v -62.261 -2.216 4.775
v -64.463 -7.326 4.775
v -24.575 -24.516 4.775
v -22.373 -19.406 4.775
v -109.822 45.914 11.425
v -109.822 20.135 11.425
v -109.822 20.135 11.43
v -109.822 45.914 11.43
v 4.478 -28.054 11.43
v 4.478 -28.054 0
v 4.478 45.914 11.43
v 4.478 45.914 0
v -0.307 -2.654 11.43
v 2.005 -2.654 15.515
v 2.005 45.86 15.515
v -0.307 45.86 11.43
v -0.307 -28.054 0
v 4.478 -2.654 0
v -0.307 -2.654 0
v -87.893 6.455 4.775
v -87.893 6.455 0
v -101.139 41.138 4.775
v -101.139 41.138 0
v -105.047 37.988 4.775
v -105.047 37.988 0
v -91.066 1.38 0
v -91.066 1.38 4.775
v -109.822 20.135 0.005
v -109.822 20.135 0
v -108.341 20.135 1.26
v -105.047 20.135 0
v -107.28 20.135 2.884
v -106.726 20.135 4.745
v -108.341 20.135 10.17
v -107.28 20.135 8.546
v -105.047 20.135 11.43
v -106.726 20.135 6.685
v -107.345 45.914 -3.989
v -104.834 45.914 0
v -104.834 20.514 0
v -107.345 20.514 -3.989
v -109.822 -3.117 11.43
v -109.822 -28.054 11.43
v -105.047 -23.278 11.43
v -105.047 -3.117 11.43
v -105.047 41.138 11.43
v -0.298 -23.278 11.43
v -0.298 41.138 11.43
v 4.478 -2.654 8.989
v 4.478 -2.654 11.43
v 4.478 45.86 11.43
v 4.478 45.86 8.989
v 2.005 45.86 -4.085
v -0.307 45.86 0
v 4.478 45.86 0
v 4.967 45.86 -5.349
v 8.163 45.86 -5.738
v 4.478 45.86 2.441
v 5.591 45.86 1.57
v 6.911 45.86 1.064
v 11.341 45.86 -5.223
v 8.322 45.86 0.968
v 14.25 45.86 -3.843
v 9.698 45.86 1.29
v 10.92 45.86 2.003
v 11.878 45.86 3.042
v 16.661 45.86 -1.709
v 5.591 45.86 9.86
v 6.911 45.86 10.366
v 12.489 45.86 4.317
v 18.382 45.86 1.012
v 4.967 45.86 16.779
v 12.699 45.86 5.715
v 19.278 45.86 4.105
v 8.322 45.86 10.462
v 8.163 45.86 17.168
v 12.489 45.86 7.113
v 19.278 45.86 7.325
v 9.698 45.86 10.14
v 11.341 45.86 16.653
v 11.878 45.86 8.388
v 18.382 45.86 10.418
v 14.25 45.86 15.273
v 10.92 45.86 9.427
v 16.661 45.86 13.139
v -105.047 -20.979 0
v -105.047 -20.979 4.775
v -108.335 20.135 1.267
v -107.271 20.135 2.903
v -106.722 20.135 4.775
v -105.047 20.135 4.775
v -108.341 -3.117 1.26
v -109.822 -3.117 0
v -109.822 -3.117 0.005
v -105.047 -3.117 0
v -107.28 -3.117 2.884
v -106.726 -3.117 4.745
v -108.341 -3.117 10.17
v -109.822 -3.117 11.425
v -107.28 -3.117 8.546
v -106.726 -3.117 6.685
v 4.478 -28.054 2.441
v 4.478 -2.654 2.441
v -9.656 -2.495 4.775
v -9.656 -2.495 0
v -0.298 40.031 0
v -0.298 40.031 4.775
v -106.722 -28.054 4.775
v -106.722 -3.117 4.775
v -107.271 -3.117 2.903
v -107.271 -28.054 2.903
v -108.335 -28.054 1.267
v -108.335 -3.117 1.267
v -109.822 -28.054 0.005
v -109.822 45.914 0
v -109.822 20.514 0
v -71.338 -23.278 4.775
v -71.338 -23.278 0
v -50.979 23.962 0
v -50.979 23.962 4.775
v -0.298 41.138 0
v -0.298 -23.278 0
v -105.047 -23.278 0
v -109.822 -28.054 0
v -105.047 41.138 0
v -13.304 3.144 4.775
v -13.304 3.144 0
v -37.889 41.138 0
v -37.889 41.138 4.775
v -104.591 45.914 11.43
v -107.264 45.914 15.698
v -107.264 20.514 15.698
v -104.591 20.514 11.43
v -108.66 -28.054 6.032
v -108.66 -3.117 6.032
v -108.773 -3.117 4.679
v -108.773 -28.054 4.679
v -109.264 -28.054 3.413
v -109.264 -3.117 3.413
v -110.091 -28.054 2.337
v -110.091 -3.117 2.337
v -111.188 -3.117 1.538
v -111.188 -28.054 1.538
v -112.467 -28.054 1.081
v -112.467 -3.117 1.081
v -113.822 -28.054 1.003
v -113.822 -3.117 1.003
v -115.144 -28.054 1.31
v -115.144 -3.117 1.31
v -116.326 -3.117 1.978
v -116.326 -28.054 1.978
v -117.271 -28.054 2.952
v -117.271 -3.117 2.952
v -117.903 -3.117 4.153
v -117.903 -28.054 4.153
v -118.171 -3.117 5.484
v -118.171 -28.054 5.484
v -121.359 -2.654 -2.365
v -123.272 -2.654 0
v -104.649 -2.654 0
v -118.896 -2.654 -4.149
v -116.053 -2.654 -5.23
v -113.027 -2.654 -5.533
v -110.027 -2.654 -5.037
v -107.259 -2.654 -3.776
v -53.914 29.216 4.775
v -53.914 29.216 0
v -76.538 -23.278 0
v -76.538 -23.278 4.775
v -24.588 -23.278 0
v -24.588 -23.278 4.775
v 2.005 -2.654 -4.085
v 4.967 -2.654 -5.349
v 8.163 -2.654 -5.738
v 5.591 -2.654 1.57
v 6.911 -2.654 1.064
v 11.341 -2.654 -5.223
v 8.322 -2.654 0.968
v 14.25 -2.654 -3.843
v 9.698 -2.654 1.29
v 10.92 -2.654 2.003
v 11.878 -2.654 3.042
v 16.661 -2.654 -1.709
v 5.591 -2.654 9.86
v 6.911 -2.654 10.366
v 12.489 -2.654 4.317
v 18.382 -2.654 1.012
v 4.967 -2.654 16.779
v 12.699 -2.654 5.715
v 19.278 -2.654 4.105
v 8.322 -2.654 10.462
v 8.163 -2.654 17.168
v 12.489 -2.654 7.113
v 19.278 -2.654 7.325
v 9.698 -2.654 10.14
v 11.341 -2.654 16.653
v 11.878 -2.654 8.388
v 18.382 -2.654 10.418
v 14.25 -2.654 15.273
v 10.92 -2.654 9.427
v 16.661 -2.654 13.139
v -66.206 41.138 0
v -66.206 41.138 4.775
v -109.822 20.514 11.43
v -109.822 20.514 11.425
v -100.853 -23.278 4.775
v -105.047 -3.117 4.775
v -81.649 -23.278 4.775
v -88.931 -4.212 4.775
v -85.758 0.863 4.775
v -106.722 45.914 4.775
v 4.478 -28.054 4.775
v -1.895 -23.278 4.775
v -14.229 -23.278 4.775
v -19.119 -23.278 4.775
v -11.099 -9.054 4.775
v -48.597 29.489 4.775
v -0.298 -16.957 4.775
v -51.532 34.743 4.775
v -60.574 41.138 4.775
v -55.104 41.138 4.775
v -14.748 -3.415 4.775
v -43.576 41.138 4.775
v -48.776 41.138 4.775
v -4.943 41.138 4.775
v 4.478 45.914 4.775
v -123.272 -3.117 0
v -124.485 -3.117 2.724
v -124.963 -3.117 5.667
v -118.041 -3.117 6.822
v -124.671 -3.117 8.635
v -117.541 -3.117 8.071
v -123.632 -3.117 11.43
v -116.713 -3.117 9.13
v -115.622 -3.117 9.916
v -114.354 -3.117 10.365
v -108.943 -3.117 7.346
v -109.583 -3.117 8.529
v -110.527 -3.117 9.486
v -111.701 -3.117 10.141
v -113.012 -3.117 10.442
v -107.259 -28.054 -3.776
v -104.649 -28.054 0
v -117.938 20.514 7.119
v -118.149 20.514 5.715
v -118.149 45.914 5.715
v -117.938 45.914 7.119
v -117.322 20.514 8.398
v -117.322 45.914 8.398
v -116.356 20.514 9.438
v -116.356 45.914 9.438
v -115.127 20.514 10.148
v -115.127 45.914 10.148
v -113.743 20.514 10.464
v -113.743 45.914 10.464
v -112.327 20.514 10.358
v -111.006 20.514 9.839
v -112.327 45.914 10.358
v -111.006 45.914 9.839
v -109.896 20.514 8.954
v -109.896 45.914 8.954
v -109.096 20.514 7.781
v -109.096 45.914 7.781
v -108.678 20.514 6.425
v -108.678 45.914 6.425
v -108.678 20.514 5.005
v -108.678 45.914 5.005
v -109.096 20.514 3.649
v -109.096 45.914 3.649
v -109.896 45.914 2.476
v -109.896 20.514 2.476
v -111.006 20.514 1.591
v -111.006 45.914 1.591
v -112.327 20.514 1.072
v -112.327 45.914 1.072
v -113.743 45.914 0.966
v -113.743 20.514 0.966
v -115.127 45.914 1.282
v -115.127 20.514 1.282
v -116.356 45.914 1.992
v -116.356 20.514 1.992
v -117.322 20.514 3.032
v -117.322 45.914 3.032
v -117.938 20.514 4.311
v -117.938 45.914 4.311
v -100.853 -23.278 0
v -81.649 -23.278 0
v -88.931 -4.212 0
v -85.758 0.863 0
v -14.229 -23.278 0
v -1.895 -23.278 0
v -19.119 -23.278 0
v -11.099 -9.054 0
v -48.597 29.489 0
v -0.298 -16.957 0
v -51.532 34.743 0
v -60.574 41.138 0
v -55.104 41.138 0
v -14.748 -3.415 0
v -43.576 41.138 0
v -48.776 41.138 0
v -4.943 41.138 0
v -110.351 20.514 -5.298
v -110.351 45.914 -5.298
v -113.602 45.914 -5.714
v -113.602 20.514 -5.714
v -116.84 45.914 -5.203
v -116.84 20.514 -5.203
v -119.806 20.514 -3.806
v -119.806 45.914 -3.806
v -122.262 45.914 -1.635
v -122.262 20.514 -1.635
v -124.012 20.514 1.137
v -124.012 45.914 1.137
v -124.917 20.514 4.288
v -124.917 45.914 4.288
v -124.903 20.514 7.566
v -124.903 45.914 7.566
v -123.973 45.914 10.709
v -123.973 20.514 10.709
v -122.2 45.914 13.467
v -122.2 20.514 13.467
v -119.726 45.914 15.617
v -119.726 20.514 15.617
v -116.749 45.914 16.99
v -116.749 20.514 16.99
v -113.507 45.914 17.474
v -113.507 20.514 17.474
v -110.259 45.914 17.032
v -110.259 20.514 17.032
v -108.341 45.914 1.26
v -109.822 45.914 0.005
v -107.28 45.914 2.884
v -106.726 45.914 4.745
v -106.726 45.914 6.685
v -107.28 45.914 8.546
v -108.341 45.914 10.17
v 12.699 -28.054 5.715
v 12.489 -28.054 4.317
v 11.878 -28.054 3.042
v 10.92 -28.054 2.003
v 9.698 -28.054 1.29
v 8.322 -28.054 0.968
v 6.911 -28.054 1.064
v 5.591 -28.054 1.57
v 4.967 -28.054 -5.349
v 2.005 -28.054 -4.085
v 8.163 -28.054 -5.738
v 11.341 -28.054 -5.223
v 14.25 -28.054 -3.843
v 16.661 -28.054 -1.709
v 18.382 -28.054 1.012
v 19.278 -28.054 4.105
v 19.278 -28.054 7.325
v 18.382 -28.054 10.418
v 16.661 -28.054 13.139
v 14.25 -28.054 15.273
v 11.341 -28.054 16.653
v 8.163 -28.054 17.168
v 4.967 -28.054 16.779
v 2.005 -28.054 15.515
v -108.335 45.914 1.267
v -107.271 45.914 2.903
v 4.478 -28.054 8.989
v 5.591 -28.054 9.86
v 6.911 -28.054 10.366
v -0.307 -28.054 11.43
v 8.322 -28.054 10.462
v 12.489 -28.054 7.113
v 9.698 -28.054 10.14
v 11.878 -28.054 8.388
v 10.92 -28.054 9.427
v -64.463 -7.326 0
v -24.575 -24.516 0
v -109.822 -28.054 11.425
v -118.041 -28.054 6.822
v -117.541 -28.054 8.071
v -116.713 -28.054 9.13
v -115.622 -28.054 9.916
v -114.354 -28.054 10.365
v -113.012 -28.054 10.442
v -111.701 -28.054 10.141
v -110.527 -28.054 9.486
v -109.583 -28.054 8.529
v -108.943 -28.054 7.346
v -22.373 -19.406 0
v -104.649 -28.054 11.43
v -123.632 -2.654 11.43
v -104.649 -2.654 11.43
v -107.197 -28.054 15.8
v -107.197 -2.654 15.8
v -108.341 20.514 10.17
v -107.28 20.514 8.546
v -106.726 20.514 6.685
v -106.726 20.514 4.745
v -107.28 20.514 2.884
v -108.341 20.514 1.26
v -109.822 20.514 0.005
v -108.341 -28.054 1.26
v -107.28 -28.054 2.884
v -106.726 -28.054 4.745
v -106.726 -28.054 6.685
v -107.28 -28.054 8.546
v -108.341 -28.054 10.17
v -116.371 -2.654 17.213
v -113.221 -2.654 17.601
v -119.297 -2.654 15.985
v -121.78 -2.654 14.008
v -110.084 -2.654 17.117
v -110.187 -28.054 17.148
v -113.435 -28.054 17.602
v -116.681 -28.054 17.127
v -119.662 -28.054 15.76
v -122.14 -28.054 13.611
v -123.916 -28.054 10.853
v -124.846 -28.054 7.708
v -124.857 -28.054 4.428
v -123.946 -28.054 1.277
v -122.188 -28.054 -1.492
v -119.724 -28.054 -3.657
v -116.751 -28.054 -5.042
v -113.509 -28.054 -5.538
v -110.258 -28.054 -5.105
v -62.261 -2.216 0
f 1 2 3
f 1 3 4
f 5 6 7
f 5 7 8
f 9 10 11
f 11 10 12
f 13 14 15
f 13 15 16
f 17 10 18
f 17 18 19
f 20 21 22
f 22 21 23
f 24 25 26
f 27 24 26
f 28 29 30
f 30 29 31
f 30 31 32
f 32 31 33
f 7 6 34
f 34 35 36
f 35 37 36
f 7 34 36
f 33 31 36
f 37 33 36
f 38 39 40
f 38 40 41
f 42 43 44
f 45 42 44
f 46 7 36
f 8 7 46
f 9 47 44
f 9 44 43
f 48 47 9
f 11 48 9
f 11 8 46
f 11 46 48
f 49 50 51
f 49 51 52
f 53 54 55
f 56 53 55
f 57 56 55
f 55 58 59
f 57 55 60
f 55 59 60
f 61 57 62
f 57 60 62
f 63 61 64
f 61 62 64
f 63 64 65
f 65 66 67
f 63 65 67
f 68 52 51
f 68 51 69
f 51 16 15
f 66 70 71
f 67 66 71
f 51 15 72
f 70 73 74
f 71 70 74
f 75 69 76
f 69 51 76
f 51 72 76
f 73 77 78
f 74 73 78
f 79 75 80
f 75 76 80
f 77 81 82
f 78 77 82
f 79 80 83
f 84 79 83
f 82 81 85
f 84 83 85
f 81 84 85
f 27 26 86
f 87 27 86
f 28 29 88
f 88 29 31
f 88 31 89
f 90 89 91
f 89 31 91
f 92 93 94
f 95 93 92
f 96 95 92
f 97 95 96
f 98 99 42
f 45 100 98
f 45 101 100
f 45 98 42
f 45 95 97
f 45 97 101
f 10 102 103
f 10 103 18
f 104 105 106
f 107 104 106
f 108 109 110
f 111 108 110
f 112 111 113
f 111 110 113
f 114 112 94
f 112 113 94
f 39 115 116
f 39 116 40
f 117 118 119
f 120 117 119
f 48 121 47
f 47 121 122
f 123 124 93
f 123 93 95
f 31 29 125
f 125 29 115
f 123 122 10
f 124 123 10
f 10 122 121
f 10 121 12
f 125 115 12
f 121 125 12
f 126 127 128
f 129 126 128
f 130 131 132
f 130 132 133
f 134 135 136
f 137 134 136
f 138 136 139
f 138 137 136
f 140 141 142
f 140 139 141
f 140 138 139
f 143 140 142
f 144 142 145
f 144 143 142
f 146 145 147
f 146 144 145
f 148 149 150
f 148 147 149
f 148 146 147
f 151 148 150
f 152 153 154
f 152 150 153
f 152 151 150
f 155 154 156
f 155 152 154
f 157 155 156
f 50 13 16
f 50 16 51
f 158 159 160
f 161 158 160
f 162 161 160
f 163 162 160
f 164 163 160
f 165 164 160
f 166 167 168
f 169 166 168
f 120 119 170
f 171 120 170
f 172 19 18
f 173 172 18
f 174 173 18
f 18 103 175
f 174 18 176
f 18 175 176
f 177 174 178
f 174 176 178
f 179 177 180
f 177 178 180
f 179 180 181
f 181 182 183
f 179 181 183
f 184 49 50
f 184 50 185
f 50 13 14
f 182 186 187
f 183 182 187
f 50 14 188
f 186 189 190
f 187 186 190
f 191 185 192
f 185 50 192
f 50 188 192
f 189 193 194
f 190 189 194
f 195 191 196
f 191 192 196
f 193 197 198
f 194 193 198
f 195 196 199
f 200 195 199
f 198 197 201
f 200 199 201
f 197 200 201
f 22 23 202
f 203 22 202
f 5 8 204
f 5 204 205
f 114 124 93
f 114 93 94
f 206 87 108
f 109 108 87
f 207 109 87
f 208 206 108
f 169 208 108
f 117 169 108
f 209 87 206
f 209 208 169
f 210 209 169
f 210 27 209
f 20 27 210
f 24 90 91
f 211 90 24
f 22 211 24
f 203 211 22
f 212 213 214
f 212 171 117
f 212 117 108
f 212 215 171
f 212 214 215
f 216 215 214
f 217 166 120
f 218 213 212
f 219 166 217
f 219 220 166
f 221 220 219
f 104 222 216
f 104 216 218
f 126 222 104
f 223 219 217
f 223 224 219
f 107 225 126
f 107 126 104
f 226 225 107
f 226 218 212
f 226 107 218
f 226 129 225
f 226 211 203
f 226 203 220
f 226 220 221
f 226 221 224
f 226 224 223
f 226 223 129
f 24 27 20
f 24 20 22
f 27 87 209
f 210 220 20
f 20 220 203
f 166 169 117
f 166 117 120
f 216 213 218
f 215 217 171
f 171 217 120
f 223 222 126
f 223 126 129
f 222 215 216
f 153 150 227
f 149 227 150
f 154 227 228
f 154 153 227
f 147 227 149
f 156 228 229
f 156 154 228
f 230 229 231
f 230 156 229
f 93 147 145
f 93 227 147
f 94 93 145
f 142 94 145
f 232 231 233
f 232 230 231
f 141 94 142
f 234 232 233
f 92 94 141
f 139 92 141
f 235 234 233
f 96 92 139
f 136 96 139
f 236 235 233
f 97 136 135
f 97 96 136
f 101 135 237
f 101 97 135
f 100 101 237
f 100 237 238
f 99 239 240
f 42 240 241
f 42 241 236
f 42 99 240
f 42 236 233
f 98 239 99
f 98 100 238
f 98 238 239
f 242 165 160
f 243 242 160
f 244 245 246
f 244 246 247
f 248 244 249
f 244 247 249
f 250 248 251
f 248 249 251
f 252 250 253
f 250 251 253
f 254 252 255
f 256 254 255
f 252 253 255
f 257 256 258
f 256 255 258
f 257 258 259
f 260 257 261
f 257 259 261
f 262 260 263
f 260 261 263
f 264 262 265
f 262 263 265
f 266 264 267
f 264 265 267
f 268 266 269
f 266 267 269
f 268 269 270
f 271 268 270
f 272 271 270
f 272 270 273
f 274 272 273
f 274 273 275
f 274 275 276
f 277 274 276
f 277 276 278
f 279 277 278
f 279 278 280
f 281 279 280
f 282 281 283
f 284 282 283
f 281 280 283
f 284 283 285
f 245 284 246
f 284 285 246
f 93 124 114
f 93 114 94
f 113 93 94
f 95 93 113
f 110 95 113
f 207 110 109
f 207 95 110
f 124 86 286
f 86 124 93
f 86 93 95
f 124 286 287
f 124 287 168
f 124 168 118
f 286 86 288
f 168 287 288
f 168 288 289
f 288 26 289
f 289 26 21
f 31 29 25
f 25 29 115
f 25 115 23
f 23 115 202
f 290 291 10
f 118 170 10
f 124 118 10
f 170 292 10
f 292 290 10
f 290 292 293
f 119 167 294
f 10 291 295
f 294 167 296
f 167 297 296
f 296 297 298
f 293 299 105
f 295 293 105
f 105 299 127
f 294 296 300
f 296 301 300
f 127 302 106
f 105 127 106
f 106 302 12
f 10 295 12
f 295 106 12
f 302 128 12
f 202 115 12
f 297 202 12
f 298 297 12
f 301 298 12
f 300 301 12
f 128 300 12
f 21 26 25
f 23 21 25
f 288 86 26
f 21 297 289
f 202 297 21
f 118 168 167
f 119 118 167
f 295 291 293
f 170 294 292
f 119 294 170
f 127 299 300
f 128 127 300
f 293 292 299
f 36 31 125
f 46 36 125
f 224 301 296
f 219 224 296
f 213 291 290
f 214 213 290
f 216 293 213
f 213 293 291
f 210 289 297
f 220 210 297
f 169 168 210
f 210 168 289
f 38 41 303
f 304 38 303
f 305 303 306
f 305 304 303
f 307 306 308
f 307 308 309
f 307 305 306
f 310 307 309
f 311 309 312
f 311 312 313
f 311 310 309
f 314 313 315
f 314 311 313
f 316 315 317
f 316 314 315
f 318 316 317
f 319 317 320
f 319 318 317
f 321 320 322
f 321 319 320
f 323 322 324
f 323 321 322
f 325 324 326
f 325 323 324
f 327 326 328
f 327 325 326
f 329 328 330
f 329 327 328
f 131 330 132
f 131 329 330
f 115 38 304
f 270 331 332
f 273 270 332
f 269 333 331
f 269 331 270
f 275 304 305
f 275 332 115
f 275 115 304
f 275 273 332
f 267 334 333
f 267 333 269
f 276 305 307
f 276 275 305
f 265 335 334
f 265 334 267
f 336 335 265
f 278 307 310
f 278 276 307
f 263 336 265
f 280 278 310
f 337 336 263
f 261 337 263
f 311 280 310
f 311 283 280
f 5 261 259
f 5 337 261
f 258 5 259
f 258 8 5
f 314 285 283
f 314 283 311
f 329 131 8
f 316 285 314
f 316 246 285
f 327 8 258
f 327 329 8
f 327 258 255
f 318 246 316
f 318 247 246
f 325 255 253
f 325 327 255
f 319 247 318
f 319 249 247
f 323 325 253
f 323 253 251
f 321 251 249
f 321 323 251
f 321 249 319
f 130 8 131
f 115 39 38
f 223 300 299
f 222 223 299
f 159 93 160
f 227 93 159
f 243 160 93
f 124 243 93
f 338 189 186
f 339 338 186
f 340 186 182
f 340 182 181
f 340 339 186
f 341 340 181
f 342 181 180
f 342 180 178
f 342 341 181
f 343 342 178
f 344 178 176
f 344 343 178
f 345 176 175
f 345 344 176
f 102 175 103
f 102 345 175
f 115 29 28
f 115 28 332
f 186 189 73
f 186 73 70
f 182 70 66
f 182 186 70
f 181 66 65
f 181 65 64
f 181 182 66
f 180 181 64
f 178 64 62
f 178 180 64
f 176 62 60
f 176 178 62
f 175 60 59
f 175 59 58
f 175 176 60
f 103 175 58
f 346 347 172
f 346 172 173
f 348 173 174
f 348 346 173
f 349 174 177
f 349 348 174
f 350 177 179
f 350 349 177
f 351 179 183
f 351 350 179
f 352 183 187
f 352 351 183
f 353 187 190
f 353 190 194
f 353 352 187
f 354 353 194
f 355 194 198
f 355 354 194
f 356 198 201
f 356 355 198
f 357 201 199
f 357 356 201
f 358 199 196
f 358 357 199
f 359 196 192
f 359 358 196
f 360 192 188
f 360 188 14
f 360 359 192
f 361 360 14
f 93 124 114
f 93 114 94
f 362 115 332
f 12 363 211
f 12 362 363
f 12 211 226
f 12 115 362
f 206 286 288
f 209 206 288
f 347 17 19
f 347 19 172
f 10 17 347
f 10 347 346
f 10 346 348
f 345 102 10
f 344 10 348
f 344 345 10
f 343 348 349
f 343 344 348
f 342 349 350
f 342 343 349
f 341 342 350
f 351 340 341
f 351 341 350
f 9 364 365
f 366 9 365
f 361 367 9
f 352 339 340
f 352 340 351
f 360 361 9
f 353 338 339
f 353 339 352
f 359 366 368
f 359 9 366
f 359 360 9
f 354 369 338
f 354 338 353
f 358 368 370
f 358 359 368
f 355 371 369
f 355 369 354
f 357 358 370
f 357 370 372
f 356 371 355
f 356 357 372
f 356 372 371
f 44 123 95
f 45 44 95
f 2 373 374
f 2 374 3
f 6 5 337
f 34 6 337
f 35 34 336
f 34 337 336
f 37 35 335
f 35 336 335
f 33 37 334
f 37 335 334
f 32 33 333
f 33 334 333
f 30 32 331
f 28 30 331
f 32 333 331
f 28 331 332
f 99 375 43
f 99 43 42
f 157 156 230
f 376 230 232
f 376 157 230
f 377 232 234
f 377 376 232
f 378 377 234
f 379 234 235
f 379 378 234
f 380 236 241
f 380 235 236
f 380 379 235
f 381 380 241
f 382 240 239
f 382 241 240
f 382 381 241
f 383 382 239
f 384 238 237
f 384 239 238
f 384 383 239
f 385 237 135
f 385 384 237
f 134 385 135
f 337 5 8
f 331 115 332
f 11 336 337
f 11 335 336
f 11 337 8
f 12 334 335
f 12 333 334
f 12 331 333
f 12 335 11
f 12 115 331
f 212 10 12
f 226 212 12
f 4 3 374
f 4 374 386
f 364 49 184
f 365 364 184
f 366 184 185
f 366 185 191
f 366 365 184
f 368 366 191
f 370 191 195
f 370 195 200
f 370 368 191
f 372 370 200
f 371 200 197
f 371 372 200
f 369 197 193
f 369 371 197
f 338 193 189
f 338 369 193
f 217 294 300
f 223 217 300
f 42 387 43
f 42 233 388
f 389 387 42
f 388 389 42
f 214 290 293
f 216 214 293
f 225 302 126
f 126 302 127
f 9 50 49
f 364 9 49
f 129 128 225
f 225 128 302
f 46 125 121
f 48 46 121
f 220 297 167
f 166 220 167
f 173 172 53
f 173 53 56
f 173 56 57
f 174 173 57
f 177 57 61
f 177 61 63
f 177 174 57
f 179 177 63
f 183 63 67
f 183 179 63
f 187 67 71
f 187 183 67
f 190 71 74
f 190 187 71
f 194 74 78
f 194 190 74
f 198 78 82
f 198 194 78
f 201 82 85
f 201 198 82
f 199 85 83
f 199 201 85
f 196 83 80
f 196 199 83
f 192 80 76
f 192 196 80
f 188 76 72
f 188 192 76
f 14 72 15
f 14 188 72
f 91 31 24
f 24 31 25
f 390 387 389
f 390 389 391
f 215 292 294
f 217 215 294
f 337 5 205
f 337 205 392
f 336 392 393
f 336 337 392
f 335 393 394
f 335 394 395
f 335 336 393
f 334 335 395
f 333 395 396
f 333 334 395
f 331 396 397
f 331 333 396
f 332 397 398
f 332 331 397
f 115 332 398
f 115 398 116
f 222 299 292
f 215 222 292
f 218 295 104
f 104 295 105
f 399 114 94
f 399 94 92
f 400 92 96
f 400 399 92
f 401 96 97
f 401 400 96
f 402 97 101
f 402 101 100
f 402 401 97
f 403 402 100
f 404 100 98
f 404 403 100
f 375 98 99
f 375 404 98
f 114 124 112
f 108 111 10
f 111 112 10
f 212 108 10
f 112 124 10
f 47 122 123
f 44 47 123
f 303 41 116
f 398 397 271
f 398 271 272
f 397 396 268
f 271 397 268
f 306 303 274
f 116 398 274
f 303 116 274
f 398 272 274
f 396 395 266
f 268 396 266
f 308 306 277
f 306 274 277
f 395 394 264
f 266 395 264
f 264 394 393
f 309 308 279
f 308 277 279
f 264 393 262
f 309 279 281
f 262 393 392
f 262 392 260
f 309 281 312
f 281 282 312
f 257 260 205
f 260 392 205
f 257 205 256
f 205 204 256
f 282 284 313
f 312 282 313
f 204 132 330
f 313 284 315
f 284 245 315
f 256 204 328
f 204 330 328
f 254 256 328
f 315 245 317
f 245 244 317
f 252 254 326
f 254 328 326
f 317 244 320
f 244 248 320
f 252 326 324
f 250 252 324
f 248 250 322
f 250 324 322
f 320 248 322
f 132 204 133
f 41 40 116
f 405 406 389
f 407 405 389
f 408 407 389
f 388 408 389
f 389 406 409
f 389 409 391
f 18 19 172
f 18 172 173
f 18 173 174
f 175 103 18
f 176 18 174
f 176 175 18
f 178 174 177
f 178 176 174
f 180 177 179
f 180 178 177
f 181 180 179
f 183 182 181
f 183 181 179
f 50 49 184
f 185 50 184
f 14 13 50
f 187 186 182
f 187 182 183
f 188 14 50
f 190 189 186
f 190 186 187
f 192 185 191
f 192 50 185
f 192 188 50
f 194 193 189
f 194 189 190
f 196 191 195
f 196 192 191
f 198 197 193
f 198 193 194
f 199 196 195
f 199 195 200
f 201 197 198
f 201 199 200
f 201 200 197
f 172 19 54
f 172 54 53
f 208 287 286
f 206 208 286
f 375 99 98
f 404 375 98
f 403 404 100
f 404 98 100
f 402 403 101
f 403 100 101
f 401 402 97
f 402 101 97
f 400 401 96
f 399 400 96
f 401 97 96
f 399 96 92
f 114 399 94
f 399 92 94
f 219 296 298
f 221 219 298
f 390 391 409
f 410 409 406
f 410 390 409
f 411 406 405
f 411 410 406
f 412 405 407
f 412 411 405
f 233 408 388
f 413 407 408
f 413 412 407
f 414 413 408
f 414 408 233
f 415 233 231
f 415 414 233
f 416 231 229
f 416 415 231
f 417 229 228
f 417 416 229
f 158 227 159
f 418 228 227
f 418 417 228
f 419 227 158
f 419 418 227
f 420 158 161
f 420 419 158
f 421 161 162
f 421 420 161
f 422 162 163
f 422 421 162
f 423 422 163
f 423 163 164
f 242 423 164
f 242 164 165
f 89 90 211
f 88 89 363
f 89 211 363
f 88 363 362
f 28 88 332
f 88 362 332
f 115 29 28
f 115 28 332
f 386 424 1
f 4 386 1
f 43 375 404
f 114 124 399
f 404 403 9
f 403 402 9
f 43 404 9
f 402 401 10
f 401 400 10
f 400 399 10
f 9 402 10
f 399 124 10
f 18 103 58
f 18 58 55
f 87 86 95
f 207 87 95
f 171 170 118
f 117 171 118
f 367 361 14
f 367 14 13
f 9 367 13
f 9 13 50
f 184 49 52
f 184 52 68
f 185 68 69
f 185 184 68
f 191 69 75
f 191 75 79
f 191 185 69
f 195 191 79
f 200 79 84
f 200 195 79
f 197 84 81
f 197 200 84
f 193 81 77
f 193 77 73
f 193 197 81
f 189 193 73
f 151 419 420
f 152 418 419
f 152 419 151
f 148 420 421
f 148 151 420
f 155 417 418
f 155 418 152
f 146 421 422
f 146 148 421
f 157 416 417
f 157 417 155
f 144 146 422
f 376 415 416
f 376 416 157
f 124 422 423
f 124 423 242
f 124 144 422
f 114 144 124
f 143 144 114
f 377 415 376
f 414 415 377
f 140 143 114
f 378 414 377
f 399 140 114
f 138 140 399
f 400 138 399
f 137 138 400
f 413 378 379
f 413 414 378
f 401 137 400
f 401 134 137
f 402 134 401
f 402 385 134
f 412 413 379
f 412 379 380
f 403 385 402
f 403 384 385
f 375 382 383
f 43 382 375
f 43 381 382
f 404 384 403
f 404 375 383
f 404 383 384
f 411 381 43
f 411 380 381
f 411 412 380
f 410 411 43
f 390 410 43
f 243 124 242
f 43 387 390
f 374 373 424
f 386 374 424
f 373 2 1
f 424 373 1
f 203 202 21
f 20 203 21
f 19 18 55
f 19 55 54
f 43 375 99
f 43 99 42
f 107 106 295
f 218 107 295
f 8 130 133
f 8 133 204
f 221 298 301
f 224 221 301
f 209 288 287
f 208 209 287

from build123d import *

# Parameters (mm, degrees)
F0_W      = 114.3
F0_H      = 73.967157311
F1_DEPTH  = 4.7752
F2_DEPTH  = 11.43
F4_D      = 13.462
F4_2_D    = 13.462
F5_R      = 4.7625
F6_DEPTH  = 25.4
F8_DEPTH  = 25.4
F9_W      = 23.2523302548
F9_H      = 11.43
F10_DEPTH = 25.4
F11_W     = 5.5641233921
F11_H     = 4.7752
F12_DEPTH = 43.434
F13_DEPTH = 48.514


# Not quite as in the source:
# - a feature names something its author has since deleted; it is built from what else it names


with BuildPart() as f1:
    # F0 (on Top) → F1 (new body)
    with BuildSketch(Plane.XY):
        with Locations((-52.6723831377, 8.9299433027)):
            Rectangle(F0_W, F0_H)
        Polygon((-105.0471831377, 37.9876717925), (-105.0471831377, 41.1383219582), (-101.1388456313, 41.1383219582), (-66.2060131753, 41.1383219582), (-60.5741511644, 41.1383219582), (-55.1043535892, 41.1383219582), (-48.7759712627, 41.1383219582), (-43.5761829824, 41.1383219582), (-37.8885207676, 41.1383219582), (-10.4127929617, 41.1383219582), (-9.5890923762, 41.1383219582), (-5.273707792, 41.1383219582), (-4.9433377569, 41.1383219582), (-0.2975831377, 41.1383219582), (-0.2975831377, 40.0308892131), (-0.2975831377, -16.9571155447), (-0.2975831377, -23.2784353529), (-1.8950043824, -23.2784353529), (-14.22920956, -23.2784353529), (-19.1186619188, -23.2784353529), (-24.5884594941, -23.2784353529), (-36.035214648, -23.2784353529), (-42.7883672511, -23.2784353529), (-71.3379746857, -23.2784353529), (-76.537762966, -23.2784353529), (-81.6493495712, -23.2784353529), (-100.8529136018, -23.2784353529), (-105.0471831377, -23.2784353529), (-105.0471831377, -20.9793318063), align=None, mode=Mode.SUBTRACT)
        Polygon((-48.5966583669, 29.4891190576), (-50.9787348492, 23.9618950121), (-24.5884594941, -23.2784353529), (-19.1186619188, -23.2784353529), align=None)
        Polygon((-50.9787348492, 23.9618950121), (-53.9140346901, 29.2162749813), (-76.537762966, -23.2784353529), (-71.3379746857, -23.2784353529), align=None)
        Polygon((-37.8885207676, 41.1383219582), (-43.5761829824, 41.1383219582), (-14.7476233332, -3.4151765974), (-13.304202216, 3.1441448502), align=None)
        Polygon((-60.5741511644, 41.1383219582), (-66.2060131753, 41.1383219582), (-87.8930449112, 6.4548268458), (-85.7575604218, 0.8631629356), align=None)
        Polygon((-4.9433377569, 41.1383219582), (-13.304202216, 3.1441448502), (-9.655600407, -2.4946375728), (-0.2975831377, 40.0308892131), (-0.2975831377, 41.1383219582), align=None)
        Polygon((-101.1388456313, 41.1383219582), (-105.0471831377, 41.1383219582), (-105.0471831377, 37.9876717925), (-91.0664245982, 1.3797248123), (-87.8930449112, 6.4548268458), align=None)
        Polygon((-91.0664245982, 1.3797248123), (-105.0471831377, -20.9793318063), (-105.0471831377, -23.2784353529), (-100.8529136018, -23.2784353529), (-88.9309401089, -4.2119390979), align=None)
        Polygon((-85.7575604218, 0.8631629356), (-88.9309401089, -4.2119390979), (-81.6493495712, -23.2784353529), (-76.537762966, -23.2784353529), align=None)
        Polygon((-9.655600407, -2.4946375728), (-11.0990215241, -9.0539590204), (-1.8950043824, -23.2784353529), (-0.2975831377, -23.2784353529), (-0.2975831377, -16.9571155447), align=None)
        Polygon((-11.0990215241, -9.0539590204), (-14.7476233332, -3.4151765974), (-19.1186619188, -23.2784353529), (-14.22920956, -23.2784353529), align=None)
        Polygon((-55.1043535892, 41.1383219582), (-60.5741511644, 41.1383219582), (-53.9140346901, 29.2162749813), (-51.5319582079, 34.7434990268), align=None)
        Polygon((-43.5761829824, 41.1383219582), (-48.7759712627, 41.1383219582), (-51.5319582079, 34.7434990268), (-48.5966583669, 29.4891190576), align=None)
        Polygon((-13.304202216, 3.1441448502), (-14.7476233332, -3.4151765974), (-11.0990215241, -9.0539590204), (-9.655600407, -2.4946375728), align=None)
        Polygon((-51.5319582079, 34.7434990268), (-53.9140346901, 29.2162749813), (-50.9787348492, 23.9618950121), (-48.5966583669, 29.4891190576), align=None)
        Polygon((-87.8930449112, 6.4548268458), (-91.0664245982, 1.3797248123), (-88.9309401089, -4.2119390979), (-85.7575604218, 0.8631629356), align=None)
    extrude(amount=F1_DEPTH)

    # F4 (through all)
    with Locations(Plane.XZ.offset(28.0536353529)):
        with Locations((-113.3868669575, 5.715)):
            Hole(F4_D / 2)


with BuildPart() as f2:
    # F0 (on Top) → F2 (new body)
    with BuildSketch(Plane.XY):
        with Locations((-52.6723831377, 8.9299433027)):
            Rectangle(F0_W, F0_H)
        Polygon((-105.0471831377, 37.9876717925), (-105.0471831377, 41.1383219582), (-101.1388456313, 41.1383219582), (-66.2060131753, 41.1383219582), (-60.5741511644, 41.1383219582), (-55.1043535892, 41.1383219582), (-48.7759712627, 41.1383219582), (-43.5761829824, 41.1383219582), (-37.8885207676, 41.1383219582), (-10.4127929617, 41.1383219582), (-9.5890923762, 41.1383219582), (-5.273707792, 41.1383219582), (-4.9433377569, 41.1383219582), (-0.2975831377, 41.1383219582), (-0.2975831377, 40.0308892131), (-0.2975831377, -16.9571155447), (-0.2975831377, -23.2784353529), (-1.8950043824, -23.2784353529), (-14.22920956, -23.2784353529), (-19.1186619188, -23.2784353529), (-24.5884594941, -23.2784353529), (-36.035214648, -23.2784353529), (-42.7883672511, -23.2784353529), (-71.3379746857, -23.2784353529), (-76.537762966, -23.2784353529), (-81.6493495712, -23.2784353529), (-100.8529136018, -23.2784353529), (-105.0471831377, -23.2784353529), (-105.0471831377, -20.9793318063), align=None, mode=Mode.SUBTRACT)
    extrude(amount=F2_DEPTH)

    # F4#2 (through all)
    with Locations(Plane.XZ.offset(28.0536353529)):
        with Locations((-113.3868669575, 5.715)):
            Hole(F4_2_D / 2)


with BuildPart() as f6:
    # F5 (on face) → F6 (new body)
    with BuildSketch(Plane(origin=(0, 45.9135219582, 0), x_dir=(-1, 0, 0), z_dir=(0, 1, 0))):
        with BuildLine():
            Line((104.8336997628, 0), (107.3452308774, -3.989065066))
            ThreePointArc((107.3452308774, -3.989065066), (125.0266367946, 5.9274575081), (107.264213264, 15.698119998))
            Line((107.264213264, 15.698119998), (104.5906469226, 11.43))
            Line((104.5906469226, 11.43), (109.8223831377, 11.43))
            Line((109.8223831377, 11.43), (109.8223831377, 11.4247124357))
            ThreePointArc((109.8223831377, 11.4247124357), (106.6558669575, 5.715), (109.8223831377, 0.0052875643))
            Line((109.8223831377, 0.0052875643), (109.8223831377, 0))
            Line((109.8223831377, 0), (104.8336997628, 0))
        make_face()
        with Locations((113.3868669575, 5.715)):
            Circle(F5_R, mode=Mode.SUBTRACT)
    extrude(amount=-F6_DEPTH)


with BuildPart() as f8:
    # F7 (on face) → F8 (new body)
    with BuildSketch(Plane.XZ.offset(28.0536353529)):
        with BuildLine():
            Line((-0.3069167142, 0), (2.00510988, -4.0852471483))
            ThreePointArc((2.00510988, -4.0852471483), (19.3918963109, 5.715), (2.00510988, 15.5152471483))
            Line((2.00510988, 15.5152471483), (-0.3069167142, 11.43))
            Line((-0.3069167142, 11.43), (4.4776168623, 11.43))
            Line((4.4776168623, 11.43), (4.4776168623, 8.9887683501))
            ThreePointArc((4.4776168623, 8.9887683501), (9.6983834917, 10.139608436), (12.6989963109, 5.715))
            ThreePointArc((12.6989963109, 5.715), (9.6983834917, 1.290391564), (4.4776168623, 2.4412316499))
            Line((4.4776168623, 2.4412316499), (4.4776168623, 0))
            Line((4.4776168623, 0), (-0.3069167142, 0))
        make_face()
    extrude(amount=-F8_DEPTH)


with BuildPart() as f8b:
    # F7 (on face) → F8, piece 2 (new body)
    with BuildSketch(Plane.XZ.offset(28.0536353529)):
        with BuildLine():
            Line((-107.2588041425, -3.7761165295), (-104.6486571431, 0))
            Line((-104.6486571431, 0), (-109.8223831377, 0))
            Line((-109.8223831377, 0), (-109.8223831377, 0.0052875643))
            ThreePointArc((-109.8223831377, 0.0052875643), (-106.6558669575, 5.715), (-109.8223831377, 11.4247124357))
            Line((-109.8223831377, 11.4247124357), (-109.8223831377, 11.43))
            Line((-109.8223831377, 11.43), (-104.6486571431, 11.43))
            Line((-104.6486571431, 11.43), (-107.1966588497, 15.7999712974))
            ThreePointArc((-107.1966588497, 15.7999712974), (-124.9681860406, 6.0682453649), (-107.2588041425, -3.7761165295))
        make_face()
        with BuildLine():
            ThreePointArc((-118.1711778045, 5.4841274396), (-113.6857560931, 10.451134302), (-108.6601093411, 6.0315144287))
            ThreePointArc((-108.6601093411, 6.0315144287), (-113.1414265767, 0.9931906529), (-118.1711778045, 5.4841274396))
        make_face(mode=Mode.SUBTRACT)
    extrude(amount=-F8_DEPTH)


with BuildPart() as f10_tool:
    # F9 (on face) → F10 (new body)
    with BuildSketch(Plane.YZ.offset(-105.0471831377)):
        with Locations((8.5088948254, 5.715)):
            Rectangle(F9_W, F9_H)
    extrude(amount=-F10_DEPTH)


with BuildPart() as f1_1:
    add(f1.part)

    # F10: cut by f10_tool
    add(f10_tool.part, mode=Mode.SUBTRACT)


with BuildPart() as f2_1:
    add(f2.part)

    # F10: cut by f10_tool
    add(f10_tool.part, mode=Mode.SUBTRACT)


with BuildPart() as f8b_1:
    add(f8b.part)

    # F10: cut by f10_tool
    add(f10_tool.part, mode=Mode.SUBTRACT)


with BuildPart() as f12:
    # F11 (on face) → F12 (new body)
    with BuildSketch(Plane(origin=(-51.702575109, 22.2823405061, 0), x_dir=(0.3957806318, 0.918345083, 0), z_dir=(0.918345083, -0.3957806318, 0))):
        with Locations((-29.4585749507, 2.3876)):
            Rectangle(F11_W, F11_H)
    extrude(amount=F12_DEPTH)


with BuildPart() as f13:
    # F13 (new): a face of the model
    f13_faces = [f8.part.faces().sort_by_distance(p)[0] for p in [
        (2.085350074, -2.6536353529, -0.3021502923),
    ]]
    extrude(f13_faces, amount=F13_DEPTH)


solid = Compound([f6.part, f8.part, f1_1.part, f2_1.part, f8b_1.part, f12.part, f13.part])
